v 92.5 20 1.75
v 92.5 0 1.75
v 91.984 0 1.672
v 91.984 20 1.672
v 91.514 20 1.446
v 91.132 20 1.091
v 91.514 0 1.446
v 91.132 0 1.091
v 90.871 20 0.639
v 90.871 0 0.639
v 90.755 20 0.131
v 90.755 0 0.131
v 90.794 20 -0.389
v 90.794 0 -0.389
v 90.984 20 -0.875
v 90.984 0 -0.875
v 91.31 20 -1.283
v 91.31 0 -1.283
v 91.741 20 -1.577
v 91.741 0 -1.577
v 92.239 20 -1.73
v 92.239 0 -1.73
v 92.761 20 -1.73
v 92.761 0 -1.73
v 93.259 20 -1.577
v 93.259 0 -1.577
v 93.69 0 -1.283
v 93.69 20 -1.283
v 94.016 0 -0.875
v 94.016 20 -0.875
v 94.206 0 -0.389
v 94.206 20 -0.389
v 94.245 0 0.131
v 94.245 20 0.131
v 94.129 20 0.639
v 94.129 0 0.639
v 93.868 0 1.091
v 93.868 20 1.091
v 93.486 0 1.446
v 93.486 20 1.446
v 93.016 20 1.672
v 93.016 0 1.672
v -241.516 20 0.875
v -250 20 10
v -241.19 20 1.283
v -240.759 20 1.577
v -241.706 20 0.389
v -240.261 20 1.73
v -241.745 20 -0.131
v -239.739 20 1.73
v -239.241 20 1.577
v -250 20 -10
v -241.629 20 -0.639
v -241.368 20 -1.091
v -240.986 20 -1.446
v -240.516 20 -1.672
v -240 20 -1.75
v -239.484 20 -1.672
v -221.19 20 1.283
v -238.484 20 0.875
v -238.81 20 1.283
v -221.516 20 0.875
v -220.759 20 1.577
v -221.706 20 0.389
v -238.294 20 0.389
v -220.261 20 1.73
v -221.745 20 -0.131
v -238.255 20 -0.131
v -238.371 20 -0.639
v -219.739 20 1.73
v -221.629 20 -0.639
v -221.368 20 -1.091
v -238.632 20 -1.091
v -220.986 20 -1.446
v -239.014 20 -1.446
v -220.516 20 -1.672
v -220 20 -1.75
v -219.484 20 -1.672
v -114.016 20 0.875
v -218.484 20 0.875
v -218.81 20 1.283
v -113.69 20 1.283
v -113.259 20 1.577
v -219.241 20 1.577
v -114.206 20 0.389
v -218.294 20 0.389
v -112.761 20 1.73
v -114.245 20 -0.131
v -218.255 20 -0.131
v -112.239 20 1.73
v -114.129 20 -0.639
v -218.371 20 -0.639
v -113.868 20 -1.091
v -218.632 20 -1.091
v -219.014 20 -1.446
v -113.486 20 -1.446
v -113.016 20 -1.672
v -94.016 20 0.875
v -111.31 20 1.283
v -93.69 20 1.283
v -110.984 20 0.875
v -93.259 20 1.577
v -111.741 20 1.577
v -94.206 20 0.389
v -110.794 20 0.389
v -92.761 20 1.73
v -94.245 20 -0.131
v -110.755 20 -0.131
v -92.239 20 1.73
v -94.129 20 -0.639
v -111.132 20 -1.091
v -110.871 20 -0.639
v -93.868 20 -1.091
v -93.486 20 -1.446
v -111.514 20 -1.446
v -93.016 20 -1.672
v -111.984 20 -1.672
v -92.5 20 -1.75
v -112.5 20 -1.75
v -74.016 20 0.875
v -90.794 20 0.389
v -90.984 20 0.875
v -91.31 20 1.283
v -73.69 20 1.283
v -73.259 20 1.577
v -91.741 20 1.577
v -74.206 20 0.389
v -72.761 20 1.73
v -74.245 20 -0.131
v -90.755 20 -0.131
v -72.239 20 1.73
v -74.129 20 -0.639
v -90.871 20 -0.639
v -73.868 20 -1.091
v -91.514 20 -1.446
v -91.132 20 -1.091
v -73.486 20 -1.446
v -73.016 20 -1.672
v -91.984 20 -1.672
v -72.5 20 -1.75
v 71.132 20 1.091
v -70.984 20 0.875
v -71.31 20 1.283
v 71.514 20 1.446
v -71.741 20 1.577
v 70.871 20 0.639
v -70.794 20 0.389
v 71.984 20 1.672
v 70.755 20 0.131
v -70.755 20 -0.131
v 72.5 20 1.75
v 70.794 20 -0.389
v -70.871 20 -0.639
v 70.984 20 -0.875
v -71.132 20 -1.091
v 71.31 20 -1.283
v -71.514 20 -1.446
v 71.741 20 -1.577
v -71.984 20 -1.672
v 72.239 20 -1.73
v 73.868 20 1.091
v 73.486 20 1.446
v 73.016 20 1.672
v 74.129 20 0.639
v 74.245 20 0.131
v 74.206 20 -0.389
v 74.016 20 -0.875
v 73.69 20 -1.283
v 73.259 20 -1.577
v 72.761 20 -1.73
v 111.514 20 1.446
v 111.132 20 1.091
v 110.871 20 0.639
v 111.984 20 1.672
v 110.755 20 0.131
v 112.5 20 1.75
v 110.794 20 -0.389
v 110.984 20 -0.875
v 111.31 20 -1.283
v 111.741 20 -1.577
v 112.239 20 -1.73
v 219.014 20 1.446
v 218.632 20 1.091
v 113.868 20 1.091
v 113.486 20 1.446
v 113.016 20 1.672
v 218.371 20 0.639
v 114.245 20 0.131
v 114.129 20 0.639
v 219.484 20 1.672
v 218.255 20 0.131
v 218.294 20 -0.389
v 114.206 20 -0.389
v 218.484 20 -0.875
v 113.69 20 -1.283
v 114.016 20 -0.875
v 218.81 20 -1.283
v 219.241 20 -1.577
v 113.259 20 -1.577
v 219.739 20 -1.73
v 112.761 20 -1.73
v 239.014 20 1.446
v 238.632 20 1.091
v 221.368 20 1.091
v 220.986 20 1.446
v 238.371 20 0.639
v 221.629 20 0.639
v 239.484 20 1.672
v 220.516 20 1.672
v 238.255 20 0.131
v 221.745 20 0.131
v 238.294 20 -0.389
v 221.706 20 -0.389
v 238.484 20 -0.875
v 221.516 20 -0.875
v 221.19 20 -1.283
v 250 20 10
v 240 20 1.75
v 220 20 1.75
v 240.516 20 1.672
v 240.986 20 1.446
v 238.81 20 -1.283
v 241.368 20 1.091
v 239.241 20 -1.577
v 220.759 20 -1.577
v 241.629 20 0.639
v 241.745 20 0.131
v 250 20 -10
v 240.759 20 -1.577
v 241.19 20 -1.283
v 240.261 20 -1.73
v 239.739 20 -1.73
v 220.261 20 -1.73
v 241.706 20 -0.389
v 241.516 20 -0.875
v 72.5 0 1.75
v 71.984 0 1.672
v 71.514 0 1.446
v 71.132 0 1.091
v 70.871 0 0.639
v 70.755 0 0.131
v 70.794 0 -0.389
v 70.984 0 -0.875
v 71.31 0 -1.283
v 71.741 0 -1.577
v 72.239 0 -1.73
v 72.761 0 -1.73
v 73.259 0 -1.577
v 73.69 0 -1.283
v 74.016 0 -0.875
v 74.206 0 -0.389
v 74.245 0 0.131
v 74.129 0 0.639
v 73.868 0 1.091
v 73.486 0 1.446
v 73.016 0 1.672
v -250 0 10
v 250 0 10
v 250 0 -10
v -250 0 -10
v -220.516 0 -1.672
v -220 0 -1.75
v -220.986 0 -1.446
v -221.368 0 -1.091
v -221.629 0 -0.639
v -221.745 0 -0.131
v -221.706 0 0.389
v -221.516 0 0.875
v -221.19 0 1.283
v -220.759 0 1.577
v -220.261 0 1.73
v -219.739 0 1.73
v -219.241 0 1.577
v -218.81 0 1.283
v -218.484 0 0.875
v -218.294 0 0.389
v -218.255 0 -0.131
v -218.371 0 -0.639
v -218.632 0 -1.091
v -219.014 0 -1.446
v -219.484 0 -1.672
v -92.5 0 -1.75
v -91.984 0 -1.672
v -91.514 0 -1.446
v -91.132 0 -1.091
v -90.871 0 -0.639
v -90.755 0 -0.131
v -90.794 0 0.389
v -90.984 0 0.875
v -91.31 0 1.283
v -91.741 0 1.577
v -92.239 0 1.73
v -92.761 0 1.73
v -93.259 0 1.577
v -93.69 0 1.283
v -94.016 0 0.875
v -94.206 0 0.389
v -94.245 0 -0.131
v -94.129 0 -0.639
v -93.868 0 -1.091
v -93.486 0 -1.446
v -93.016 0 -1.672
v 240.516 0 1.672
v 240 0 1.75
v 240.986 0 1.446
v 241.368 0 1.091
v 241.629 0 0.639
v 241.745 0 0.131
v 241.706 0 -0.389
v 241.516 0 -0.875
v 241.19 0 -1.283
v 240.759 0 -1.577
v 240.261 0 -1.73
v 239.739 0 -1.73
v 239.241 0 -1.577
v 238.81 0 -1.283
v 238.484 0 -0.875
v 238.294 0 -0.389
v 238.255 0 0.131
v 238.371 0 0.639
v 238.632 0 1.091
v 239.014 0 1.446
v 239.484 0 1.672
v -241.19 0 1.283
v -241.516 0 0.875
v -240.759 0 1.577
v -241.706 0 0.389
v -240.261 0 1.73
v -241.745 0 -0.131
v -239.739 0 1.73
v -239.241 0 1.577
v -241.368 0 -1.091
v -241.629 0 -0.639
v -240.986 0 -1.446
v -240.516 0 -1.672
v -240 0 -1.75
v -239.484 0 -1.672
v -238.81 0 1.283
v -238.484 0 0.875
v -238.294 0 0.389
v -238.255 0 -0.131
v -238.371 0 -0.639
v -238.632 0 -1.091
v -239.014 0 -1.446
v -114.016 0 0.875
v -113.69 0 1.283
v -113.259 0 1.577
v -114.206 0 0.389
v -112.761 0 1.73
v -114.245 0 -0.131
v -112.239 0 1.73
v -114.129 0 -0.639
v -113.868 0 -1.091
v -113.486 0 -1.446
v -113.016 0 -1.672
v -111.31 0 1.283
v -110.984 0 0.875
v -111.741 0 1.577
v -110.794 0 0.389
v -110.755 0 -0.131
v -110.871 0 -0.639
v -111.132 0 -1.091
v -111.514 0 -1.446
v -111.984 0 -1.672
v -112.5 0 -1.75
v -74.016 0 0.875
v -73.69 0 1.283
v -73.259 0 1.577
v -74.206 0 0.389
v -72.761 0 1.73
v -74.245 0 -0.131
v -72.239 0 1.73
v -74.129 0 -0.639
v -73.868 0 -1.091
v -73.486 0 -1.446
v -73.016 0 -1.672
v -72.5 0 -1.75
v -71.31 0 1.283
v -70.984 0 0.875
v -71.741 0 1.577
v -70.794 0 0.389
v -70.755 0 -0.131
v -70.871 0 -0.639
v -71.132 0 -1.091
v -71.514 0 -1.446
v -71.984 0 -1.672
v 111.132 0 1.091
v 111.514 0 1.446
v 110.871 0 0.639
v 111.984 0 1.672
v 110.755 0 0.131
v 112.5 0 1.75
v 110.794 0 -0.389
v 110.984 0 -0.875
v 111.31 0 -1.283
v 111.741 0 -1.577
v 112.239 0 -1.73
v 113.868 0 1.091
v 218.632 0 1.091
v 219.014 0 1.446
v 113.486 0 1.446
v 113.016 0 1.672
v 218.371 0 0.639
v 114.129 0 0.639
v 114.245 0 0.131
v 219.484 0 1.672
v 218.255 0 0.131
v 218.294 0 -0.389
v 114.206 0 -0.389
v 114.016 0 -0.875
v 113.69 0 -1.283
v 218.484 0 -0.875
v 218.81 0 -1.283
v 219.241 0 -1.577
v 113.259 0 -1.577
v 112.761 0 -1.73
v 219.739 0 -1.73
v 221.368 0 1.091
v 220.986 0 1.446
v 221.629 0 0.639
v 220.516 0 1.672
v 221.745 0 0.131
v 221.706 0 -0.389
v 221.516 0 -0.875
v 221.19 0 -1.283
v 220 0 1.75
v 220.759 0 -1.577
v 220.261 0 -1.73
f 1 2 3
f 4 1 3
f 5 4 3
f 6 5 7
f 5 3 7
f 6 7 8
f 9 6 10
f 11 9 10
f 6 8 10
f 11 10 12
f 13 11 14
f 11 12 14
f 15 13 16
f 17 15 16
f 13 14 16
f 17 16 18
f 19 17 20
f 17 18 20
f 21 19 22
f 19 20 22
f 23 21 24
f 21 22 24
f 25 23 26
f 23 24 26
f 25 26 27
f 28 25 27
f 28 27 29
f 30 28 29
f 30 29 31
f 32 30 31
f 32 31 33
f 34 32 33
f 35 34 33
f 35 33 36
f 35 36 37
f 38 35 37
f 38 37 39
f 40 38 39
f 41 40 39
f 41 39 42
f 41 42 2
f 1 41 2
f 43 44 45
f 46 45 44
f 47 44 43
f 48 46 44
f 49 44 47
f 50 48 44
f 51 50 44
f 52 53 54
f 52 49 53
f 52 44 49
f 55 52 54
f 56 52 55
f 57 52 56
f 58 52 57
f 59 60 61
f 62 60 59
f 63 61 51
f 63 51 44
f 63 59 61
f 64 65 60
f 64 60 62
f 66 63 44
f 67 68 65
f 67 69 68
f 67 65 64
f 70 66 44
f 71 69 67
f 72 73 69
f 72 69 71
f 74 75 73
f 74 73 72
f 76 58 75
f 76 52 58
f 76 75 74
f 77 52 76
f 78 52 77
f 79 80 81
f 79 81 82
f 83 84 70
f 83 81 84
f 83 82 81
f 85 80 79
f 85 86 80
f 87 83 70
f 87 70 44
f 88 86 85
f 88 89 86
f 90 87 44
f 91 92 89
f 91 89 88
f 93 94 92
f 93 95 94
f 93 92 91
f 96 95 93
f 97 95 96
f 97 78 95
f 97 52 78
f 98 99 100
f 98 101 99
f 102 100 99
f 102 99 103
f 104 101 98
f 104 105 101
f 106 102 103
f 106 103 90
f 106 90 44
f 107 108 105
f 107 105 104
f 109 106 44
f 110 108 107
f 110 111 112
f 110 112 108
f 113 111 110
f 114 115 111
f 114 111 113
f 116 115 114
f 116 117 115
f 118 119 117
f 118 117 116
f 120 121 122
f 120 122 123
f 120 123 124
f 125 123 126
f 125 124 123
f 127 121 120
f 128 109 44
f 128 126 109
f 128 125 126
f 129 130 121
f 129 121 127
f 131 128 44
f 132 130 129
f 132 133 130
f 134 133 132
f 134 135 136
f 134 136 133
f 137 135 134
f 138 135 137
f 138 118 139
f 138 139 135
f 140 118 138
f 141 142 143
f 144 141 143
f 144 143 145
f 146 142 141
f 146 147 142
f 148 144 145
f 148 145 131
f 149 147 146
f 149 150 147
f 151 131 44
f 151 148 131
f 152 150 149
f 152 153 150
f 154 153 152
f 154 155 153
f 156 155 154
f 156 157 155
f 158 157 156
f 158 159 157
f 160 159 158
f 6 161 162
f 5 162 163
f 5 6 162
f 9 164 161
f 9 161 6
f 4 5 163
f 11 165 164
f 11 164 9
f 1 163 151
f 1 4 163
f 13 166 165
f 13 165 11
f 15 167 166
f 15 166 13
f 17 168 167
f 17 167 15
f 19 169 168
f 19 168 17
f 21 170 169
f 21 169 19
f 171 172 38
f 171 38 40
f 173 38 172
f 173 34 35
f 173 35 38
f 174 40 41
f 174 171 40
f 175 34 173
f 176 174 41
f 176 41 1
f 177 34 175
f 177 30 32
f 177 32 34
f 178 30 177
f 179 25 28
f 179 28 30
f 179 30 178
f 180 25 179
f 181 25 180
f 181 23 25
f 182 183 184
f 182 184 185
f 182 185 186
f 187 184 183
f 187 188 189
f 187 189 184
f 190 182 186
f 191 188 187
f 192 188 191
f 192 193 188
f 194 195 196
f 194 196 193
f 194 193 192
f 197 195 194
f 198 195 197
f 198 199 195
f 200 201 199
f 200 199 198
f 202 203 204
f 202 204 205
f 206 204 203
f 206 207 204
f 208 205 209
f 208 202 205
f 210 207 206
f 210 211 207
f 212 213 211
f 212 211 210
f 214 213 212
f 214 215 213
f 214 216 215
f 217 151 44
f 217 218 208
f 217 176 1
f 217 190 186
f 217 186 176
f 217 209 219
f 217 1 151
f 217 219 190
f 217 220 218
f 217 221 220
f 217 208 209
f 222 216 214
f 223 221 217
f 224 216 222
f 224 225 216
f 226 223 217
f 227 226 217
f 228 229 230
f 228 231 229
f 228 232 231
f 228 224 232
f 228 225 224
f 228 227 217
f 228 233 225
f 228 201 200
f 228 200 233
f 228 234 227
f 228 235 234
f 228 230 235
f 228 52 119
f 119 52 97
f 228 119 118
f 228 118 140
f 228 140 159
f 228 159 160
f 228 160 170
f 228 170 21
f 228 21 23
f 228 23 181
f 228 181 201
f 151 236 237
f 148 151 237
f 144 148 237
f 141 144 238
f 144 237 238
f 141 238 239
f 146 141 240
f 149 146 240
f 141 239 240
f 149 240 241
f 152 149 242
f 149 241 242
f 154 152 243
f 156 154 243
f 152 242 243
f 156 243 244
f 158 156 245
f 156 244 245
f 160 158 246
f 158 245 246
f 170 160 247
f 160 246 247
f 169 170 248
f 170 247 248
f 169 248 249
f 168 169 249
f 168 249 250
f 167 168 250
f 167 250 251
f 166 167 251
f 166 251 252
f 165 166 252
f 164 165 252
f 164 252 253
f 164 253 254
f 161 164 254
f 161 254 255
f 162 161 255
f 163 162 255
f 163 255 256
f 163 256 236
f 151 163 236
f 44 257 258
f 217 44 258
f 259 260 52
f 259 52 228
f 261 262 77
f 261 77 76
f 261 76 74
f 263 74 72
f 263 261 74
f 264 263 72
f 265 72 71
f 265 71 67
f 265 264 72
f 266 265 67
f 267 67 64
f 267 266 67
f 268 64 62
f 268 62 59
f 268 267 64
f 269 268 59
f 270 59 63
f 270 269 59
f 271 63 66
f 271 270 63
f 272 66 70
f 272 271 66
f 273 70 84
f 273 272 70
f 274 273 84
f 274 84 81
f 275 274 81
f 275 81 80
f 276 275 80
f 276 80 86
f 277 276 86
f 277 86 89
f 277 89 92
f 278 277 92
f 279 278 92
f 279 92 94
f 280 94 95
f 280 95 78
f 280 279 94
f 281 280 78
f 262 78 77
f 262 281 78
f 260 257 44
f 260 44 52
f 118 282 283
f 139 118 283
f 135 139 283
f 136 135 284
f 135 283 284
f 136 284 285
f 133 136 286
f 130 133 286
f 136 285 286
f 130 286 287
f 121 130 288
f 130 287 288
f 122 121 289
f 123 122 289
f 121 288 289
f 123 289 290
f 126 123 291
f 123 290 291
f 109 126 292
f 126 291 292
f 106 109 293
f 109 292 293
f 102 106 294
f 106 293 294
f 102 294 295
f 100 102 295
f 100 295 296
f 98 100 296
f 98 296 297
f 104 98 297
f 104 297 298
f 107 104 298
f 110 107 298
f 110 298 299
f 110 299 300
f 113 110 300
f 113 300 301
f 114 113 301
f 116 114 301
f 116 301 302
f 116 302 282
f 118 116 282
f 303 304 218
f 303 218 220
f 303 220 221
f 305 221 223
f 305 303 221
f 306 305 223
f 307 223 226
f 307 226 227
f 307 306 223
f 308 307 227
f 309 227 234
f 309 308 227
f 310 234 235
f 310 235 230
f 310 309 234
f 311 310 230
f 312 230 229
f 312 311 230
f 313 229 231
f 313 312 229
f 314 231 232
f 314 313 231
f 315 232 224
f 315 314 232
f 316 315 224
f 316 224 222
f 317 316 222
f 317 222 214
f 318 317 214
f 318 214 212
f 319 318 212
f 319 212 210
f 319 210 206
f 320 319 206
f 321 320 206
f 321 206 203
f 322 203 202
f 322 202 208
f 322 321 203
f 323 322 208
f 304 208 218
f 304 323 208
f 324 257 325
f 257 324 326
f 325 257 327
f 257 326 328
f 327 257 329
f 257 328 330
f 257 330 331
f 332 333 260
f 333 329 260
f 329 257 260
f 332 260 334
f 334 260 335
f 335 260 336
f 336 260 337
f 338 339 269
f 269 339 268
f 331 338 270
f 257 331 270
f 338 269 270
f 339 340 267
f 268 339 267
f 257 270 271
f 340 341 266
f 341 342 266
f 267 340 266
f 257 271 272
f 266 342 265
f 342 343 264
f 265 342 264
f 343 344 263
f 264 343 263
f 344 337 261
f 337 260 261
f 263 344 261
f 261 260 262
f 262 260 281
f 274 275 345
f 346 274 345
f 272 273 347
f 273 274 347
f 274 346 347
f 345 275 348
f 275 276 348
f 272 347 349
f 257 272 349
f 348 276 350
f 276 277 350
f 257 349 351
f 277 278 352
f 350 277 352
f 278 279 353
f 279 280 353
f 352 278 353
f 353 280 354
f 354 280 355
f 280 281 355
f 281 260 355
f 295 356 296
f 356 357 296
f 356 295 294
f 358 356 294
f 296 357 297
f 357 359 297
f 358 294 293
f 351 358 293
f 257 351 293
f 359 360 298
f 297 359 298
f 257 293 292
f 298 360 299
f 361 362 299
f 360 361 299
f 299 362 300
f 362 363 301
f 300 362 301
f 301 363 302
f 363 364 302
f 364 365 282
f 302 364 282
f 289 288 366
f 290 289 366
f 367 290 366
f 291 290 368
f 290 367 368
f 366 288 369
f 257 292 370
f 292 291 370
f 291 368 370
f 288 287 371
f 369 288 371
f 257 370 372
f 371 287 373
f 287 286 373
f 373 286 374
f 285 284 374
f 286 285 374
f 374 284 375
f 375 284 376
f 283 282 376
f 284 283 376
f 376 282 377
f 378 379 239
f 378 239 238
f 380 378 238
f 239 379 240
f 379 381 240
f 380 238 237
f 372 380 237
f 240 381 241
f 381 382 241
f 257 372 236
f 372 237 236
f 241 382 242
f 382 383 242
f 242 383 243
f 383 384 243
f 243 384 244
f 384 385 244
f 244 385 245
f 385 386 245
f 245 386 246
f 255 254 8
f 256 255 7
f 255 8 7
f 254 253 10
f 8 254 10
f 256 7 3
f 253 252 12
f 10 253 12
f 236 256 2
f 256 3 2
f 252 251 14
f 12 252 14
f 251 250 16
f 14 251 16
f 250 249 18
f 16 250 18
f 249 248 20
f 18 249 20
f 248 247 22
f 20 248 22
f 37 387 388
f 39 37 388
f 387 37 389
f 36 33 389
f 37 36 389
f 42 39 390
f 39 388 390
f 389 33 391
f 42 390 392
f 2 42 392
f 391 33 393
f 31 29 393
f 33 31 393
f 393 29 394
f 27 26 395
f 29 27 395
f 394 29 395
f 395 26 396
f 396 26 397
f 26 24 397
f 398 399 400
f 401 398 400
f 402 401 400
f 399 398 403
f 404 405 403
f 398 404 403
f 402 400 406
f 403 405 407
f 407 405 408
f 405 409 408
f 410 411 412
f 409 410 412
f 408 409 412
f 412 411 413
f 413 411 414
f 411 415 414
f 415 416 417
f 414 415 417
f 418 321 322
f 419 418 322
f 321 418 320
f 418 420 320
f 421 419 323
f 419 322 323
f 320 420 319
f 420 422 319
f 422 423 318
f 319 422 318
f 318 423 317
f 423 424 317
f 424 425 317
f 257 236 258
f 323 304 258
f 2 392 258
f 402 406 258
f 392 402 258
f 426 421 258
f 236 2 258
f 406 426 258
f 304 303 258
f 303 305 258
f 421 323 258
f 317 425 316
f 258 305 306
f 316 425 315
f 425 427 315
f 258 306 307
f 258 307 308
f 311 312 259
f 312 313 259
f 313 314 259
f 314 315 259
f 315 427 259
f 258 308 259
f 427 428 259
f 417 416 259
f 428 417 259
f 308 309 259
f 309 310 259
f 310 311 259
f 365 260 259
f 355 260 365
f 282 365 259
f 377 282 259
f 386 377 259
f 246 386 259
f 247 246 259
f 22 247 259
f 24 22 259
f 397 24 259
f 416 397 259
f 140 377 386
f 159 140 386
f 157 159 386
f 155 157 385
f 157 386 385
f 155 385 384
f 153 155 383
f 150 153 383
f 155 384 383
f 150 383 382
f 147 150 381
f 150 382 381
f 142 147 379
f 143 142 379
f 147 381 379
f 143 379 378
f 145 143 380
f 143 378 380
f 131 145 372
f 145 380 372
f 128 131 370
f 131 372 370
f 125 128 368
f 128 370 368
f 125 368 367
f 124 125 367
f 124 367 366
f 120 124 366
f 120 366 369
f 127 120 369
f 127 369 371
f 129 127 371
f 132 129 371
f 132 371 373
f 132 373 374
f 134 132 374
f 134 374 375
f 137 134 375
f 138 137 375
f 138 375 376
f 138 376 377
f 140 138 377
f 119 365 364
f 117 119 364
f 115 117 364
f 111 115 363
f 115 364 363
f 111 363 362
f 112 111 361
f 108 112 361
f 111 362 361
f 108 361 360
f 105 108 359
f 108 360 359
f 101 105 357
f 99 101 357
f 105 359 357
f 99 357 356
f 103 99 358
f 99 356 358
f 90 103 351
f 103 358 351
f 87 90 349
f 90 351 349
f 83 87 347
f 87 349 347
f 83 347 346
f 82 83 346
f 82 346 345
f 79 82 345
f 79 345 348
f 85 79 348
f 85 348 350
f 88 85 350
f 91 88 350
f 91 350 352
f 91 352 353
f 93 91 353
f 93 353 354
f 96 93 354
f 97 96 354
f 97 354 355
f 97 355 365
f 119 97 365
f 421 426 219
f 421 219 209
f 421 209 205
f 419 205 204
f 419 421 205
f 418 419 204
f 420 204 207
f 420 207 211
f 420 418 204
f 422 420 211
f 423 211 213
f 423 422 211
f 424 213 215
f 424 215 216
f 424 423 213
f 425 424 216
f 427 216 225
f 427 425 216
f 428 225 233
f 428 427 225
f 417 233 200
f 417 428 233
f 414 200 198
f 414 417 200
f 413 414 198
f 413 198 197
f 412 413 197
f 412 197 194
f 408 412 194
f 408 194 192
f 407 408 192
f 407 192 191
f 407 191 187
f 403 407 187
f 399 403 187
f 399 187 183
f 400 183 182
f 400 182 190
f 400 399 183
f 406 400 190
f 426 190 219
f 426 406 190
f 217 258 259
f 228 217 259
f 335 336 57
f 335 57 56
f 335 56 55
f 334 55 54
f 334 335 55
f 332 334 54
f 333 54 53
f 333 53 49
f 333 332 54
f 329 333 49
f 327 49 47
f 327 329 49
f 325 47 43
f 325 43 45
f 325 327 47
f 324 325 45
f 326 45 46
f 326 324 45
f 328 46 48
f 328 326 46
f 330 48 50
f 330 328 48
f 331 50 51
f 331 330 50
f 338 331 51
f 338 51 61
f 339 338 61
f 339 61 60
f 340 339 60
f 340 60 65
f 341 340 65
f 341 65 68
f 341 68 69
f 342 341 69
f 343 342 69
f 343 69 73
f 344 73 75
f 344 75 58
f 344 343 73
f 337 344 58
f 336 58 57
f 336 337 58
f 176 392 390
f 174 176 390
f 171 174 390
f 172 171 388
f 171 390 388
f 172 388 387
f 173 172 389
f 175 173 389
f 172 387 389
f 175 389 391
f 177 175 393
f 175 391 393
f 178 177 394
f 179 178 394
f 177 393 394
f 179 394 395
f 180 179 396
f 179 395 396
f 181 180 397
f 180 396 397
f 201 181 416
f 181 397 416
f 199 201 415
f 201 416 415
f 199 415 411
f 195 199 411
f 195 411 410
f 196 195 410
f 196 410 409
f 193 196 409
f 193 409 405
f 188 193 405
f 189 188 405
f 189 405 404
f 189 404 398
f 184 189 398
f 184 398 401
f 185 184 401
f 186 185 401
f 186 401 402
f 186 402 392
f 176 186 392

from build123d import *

# Parameters (mm, degrees)
SKETCH_1_W          = 500
SKETCH_1_H          = 20
SKETCH_1_R          = 1.75
EXTRUDE_1_DEPTH     = 20
CUT_EXTRUDE_1_REACH = 252.998
SKETCH_2_R          = 1.75


with BuildPart() as part:
    # 草图1 → 凸台-拉伸1 (new body)
    with BuildSketch(Plane(origin=(0, 0, 0), x_dir=(1, 0, 0), z_dir=(0, 1, 0))):
        Rectangle(SKETCH_1_W, SKETCH_1_H)
        with Locations(Location((240, 0, 0), (0, 0, 270))):
            Circle(SKETCH_1_R, mode=Mode.SUBTRACT)
        with Locations(Location((220, 0, 0), (0, 0, 270))):
            Circle(SKETCH_1_R, mode=Mode.SUBTRACT)
        with Locations(Location((-240, 0, 0), (0, 0, 90))):
            Circle(SKETCH_1_R, mode=Mode.SUBTRACT)
        with Locations(Location((-220, 0, 0), (0, 0, 90))):
            Circle(SKETCH_1_R, mode=Mode.SUBTRACT)
    extrude(amount=EXTRUDE_1_DEPTH)

    # 草图2 → 切除-拉伸1 (cut, up to next)
    with BuildSketch(Plane.XZ, mode=Mode.PRIVATE) as cut_extrude_1_sk1:
        with Locations(Location((-92.5, 0, 0), (0, 0, 270))):
            Circle(SKETCH_2_R)
    cut_extrude_1_tool1 = extrude(cut_extrude_1_sk1.sketch, amount=-CUT_EXTRUDE_1_REACH, mode=Mode.PRIVATE) & part.part
    # 草图2 → 切除-拉伸1 (cut, up to next)
    with BuildSketch(Plane.XZ, mode=Mode.PRIVATE) as cut_extrude_1_sk2:
        with Locations(Location((-72.5, 0, 0), (0, 0, 270))):
            Circle(SKETCH_2_R)
    cut_extrude_1_tool2 = extrude(cut_extrude_1_sk2.sketch, amount=-CUT_EXTRUDE_1_REACH, mode=Mode.PRIVATE) & part.part
    # 草图2 → 切除-拉伸1 (cut, up to next)
    with BuildSketch(Plane.XZ, mode=Mode.PRIVATE) as cut_extrude_1_sk3:
        with Locations(Location((-112.5, 0, 0), (0, 0, 270))):
            Circle(SKETCH_2_R)
    cut_extrude_1_tool3 = extrude(cut_extrude_1_sk3.sketch, amount=-CUT_EXTRUDE_1_REACH, mode=Mode.PRIVATE) & part.part
    # 草图2 → 切除-拉伸1 (cut, up to next)
    with BuildSketch(Plane.XZ, mode=Mode.PRIVATE) as cut_extrude_1_sk4:
        with Locations(Location((112.5, 0, 0), (0, 0, 90))):
            Circle(SKETCH_2_R)
    cut_extrude_1_tool4 = extrude(cut_extrude_1_sk4.sketch, amount=-CUT_EXTRUDE_1_REACH, mode=Mode.PRIVATE) & part.part
    # 草图2 → 切除-拉伸1 (cut, up to next)
    with BuildSketch(Plane.XZ, mode=Mode.PRIVATE) as cut_extrude_1_sk5:
        with Locations(Location((92.5, 0, 0), (0, 0, 90))):
            Circle(SKETCH_2_R)
    cut_extrude_1_tool5 = extrude(cut_extrude_1_sk5.sketch, amount=-CUT_EXTRUDE_1_REACH, mode=Mode.PRIVATE) & part.part
    # 草图2 → 切除-拉伸1 (cut, up to next)
    with BuildSketch(Plane.XZ, mode=Mode.PRIVATE) as cut_extrude_1_sk6:
        with Locations(Location((72.5, 0, 0), (0, 0, 90))):
            Circle(SKETCH_2_R)
    cut_extrude_1_tool6 = extrude(cut_extrude_1_sk6.sketch, amount=-CUT_EXTRUDE_1_REACH, mode=Mode.PRIVATE) & part.part
    add(cut_extrude_1_tool1.solids().sort_by_distance((-92.5, 0, 0))[0], mode=Mode.SUBTRACT)
    add(cut_extrude_1_tool2.solids().sort_by_distance((-72.5, 0, 0))[0], mode=Mode.SUBTRACT)
    add(cut_extrude_1_tool3.solids().sort_by_distance((-112.5, 0, 0))[0], mode=Mode.SUBTRACT)
    add(cut_extrude_1_tool4.solids().sort_by_distance((112.5, 0, 0))[0], mode=Mode.SUBTRACT)
    add(cut_extrude_1_tool5.solids().sort_by_distance((92.5, 0, 0))[0], mode=Mode.SUBTRACT)
    add(cut_extrude_1_tool6.solids().sort_by_distance((72.5, 0, 0))[0], mode=Mode.SUBTRACT)


solid = part.part
